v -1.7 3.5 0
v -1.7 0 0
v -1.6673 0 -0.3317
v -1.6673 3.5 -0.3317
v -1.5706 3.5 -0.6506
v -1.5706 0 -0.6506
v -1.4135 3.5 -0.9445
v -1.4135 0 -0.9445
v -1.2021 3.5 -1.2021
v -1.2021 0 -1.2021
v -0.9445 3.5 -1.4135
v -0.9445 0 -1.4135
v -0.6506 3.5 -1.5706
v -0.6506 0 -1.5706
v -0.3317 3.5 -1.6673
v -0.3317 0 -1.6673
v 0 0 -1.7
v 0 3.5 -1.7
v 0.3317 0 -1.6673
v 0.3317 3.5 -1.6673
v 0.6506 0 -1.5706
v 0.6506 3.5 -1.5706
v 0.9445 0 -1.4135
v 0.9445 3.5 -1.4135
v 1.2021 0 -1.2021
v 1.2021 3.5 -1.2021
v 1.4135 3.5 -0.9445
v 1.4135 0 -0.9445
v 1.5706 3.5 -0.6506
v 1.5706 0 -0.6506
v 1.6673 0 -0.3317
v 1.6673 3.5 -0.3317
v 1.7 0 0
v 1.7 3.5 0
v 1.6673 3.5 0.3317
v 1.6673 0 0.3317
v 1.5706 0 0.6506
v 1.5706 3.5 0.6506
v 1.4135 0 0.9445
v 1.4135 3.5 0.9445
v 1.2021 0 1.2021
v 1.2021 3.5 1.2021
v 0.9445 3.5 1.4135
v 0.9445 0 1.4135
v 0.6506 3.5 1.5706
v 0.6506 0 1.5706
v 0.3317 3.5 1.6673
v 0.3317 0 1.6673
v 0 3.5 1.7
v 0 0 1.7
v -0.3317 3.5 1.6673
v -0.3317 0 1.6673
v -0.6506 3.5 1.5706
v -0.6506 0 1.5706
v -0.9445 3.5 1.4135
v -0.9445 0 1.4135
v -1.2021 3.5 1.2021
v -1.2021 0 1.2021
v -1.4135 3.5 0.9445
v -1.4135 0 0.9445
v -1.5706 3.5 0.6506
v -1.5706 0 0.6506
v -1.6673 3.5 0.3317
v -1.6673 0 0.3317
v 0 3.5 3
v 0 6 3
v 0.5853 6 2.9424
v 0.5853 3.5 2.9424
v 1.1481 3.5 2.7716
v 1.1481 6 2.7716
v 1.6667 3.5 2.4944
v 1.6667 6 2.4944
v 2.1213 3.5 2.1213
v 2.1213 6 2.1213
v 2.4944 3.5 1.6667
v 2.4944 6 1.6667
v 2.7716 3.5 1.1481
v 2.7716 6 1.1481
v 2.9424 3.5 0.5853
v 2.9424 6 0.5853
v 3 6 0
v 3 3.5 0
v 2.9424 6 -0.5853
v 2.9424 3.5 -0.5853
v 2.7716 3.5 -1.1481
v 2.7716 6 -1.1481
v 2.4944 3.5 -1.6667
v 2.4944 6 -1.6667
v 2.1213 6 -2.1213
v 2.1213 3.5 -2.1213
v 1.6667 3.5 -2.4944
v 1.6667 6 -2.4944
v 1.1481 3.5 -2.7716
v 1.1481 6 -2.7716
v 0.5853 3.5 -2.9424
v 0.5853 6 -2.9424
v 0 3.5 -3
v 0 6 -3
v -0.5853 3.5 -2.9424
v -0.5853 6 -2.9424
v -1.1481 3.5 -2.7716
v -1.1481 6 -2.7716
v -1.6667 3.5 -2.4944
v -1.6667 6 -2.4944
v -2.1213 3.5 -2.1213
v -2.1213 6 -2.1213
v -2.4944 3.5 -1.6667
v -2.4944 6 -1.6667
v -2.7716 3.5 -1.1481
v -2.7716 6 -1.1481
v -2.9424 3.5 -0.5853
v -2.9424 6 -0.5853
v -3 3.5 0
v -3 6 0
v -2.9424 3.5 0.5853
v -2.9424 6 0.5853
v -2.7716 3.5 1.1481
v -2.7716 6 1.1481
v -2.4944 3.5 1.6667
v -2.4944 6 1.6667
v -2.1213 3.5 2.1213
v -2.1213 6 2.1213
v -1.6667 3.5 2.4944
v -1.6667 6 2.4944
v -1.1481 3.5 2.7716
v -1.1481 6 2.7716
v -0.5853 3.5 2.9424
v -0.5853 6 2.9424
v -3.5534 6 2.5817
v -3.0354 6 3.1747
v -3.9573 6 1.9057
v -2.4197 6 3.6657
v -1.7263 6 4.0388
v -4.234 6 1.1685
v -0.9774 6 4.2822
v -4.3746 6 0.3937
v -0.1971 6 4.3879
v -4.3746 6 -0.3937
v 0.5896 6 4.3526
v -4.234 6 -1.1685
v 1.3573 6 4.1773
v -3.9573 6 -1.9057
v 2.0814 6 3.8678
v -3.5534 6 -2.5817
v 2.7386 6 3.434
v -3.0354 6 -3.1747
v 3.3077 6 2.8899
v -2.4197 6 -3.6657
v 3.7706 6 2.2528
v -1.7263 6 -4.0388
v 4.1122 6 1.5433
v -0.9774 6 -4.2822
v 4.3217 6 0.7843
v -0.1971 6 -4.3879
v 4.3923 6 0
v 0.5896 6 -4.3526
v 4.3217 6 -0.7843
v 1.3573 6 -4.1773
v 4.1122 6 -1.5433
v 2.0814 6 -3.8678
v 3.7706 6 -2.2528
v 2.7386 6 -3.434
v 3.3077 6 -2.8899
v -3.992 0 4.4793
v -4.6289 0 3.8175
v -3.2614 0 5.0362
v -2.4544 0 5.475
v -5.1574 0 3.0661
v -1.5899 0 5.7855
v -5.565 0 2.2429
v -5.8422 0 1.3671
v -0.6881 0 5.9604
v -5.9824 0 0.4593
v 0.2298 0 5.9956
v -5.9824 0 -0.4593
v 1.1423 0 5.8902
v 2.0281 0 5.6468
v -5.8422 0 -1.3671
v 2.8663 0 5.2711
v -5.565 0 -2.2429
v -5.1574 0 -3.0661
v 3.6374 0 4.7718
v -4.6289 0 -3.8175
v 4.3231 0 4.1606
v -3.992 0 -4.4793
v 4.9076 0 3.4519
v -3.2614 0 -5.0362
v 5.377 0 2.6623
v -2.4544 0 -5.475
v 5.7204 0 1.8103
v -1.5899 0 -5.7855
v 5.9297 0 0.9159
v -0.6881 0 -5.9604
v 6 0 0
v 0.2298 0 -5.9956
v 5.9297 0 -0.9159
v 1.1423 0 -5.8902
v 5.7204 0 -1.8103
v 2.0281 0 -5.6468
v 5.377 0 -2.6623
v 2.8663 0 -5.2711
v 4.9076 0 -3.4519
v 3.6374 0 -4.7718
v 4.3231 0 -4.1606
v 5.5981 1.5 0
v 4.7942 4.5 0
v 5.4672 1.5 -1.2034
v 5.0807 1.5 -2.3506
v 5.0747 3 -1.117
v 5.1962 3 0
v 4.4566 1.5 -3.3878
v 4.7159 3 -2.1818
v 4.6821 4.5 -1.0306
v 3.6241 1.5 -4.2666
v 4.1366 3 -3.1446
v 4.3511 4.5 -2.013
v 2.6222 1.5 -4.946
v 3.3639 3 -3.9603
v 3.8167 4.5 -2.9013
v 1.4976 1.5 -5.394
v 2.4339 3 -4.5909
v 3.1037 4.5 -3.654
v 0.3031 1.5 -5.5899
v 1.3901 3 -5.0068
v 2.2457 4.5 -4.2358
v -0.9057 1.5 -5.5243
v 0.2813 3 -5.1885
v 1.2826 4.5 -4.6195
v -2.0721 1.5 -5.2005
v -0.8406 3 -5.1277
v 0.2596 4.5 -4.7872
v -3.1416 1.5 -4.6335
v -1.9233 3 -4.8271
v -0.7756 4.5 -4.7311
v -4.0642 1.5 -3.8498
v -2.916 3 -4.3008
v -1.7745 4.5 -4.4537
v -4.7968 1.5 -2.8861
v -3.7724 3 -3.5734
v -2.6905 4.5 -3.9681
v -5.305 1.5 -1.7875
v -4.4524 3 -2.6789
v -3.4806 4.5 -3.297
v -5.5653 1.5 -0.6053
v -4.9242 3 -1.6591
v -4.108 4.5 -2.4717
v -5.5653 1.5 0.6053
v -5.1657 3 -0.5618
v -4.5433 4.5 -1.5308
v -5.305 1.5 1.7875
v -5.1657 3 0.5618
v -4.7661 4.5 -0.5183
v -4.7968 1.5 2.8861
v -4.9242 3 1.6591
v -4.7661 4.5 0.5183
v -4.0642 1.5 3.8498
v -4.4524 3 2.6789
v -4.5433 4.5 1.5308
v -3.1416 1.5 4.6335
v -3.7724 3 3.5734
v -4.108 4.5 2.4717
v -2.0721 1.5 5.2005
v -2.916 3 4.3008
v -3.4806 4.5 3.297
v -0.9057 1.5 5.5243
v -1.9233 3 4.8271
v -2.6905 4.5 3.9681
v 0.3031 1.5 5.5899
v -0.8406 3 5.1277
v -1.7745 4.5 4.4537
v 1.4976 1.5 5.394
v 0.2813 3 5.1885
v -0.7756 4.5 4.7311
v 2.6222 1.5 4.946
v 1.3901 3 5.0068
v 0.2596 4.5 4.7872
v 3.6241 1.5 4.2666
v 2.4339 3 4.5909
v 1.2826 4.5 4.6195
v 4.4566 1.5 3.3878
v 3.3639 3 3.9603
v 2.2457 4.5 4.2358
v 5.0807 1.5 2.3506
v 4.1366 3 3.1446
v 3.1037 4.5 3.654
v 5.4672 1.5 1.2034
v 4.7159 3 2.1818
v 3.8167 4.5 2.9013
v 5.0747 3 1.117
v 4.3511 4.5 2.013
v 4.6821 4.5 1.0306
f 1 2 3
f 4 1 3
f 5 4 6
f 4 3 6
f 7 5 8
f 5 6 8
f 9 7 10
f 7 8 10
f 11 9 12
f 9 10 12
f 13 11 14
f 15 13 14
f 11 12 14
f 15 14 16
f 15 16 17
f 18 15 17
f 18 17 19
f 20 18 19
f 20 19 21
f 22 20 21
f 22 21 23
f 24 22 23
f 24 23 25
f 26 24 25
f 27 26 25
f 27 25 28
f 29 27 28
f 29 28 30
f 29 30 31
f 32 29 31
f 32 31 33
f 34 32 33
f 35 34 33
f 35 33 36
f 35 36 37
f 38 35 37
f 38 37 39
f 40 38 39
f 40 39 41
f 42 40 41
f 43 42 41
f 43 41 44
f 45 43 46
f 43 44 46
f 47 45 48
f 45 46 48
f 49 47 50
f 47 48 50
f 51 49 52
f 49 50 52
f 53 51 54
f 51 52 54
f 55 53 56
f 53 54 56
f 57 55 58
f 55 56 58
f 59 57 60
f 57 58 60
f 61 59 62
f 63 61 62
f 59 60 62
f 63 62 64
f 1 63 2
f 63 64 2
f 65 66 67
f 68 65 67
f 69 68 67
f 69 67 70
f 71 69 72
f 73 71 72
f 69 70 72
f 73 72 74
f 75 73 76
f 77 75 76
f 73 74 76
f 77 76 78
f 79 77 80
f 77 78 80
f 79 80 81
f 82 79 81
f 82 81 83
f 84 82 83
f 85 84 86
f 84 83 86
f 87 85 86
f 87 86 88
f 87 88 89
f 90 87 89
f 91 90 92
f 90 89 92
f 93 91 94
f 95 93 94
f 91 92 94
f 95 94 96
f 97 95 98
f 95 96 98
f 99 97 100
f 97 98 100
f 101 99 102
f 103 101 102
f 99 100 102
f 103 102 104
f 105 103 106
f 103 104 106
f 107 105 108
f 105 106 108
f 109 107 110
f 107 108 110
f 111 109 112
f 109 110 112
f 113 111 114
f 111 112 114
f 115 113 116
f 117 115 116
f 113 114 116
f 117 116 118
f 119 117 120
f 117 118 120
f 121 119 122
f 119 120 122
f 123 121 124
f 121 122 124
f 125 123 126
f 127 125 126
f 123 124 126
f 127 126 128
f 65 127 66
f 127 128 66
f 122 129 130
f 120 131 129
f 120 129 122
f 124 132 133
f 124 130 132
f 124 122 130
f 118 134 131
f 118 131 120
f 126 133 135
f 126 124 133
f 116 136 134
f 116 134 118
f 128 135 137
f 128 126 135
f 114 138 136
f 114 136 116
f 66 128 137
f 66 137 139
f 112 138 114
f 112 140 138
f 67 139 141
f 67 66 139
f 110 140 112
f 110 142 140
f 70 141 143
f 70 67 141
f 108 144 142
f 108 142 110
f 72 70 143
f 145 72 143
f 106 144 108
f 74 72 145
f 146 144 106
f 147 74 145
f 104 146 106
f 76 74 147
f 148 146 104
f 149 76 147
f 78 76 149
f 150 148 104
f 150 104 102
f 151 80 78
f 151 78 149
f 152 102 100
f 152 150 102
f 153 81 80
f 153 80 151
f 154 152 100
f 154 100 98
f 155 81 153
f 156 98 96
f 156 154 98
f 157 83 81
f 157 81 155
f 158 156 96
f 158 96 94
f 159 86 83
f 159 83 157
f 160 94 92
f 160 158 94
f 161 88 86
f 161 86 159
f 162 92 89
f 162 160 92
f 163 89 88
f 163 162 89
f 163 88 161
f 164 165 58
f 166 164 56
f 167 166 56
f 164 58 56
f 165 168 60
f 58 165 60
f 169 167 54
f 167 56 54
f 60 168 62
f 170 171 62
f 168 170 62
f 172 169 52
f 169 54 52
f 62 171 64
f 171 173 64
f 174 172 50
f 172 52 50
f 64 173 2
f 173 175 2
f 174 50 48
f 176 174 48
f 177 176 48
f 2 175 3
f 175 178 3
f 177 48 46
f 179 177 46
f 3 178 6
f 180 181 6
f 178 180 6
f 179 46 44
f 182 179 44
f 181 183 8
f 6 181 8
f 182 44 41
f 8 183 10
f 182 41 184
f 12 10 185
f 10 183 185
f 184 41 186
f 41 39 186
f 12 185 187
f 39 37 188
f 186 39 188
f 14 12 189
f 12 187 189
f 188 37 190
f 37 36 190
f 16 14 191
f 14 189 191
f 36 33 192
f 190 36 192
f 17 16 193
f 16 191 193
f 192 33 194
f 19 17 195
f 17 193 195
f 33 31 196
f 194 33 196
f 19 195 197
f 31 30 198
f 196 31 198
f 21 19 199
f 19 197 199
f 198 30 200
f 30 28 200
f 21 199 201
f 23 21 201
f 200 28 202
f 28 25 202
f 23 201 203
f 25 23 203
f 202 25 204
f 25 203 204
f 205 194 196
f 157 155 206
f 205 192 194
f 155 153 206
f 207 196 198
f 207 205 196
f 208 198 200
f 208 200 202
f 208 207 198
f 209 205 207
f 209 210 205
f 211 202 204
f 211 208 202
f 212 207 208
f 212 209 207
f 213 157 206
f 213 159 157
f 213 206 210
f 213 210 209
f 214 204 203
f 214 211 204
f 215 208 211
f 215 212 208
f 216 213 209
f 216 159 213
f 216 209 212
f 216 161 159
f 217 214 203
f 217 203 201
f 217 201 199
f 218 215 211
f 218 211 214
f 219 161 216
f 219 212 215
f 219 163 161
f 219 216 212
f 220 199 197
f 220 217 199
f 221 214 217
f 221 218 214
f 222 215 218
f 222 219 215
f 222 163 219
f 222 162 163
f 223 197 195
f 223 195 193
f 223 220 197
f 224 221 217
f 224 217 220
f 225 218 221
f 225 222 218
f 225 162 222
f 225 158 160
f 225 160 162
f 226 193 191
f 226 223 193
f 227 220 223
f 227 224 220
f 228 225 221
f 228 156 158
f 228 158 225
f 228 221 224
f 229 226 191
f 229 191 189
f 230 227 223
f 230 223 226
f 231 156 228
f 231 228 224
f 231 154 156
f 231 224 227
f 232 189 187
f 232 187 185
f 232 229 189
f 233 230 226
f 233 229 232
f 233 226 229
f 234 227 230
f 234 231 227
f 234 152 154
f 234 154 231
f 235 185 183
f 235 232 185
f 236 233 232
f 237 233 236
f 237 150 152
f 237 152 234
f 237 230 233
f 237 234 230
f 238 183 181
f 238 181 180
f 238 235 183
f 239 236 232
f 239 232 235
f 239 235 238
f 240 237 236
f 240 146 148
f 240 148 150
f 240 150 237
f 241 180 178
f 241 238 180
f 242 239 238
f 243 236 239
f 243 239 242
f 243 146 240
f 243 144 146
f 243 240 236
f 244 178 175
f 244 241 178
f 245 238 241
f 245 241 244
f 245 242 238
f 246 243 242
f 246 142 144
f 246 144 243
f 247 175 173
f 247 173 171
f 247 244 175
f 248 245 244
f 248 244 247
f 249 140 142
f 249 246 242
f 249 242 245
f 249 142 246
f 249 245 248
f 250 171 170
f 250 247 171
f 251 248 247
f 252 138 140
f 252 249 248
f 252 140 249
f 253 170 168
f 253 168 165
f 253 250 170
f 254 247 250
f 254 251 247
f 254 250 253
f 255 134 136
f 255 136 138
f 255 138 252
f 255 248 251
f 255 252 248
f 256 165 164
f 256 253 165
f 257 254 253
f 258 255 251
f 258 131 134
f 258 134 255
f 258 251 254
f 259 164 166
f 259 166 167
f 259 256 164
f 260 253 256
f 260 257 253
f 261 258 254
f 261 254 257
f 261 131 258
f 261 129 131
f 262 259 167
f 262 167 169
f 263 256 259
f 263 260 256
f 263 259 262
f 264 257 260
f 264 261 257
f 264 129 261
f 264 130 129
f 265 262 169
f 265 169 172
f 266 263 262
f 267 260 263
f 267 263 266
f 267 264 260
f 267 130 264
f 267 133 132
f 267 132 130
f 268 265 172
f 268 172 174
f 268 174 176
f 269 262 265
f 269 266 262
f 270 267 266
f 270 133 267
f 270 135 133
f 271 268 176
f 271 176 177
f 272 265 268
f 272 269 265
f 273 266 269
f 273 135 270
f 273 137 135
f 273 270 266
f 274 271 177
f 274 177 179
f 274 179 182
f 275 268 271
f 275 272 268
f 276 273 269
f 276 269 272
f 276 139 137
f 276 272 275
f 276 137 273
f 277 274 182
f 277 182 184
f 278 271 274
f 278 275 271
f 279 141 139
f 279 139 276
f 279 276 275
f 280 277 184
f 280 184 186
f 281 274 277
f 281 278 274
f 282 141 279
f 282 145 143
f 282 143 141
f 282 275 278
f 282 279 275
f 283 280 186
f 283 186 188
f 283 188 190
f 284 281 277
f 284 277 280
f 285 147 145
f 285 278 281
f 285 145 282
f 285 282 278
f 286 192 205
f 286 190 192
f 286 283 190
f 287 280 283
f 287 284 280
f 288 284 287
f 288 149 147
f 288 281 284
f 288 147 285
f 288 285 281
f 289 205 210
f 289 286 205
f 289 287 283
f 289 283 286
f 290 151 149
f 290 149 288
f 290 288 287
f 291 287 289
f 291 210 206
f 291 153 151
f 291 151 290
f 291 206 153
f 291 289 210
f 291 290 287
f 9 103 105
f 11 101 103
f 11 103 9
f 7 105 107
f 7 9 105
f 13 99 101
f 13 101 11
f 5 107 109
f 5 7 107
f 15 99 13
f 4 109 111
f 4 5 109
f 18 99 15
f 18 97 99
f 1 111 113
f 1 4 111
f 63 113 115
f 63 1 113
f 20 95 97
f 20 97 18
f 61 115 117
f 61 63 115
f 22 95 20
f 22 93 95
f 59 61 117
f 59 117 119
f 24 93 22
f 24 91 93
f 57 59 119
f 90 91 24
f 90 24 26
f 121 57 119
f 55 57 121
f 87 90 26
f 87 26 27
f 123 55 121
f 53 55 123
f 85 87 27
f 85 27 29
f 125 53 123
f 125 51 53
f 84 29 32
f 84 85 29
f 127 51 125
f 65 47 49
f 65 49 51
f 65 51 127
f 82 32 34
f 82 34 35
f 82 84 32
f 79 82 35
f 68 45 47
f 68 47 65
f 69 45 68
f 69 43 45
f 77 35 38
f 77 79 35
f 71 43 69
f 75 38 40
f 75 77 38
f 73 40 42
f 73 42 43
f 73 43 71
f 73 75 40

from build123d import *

# Parameters (mm, degrees)
ESQUISSE1_R             = 6
BOSS_EXTRU_1_DEPTH      = 6
BOSS_EXTRU_1_TAPER      = 15
ESQUISSE2_R             = 3
ENL_V_MAT_EXTRU_1_DEPTH = 2.5
D_GAGEMENT_M31_D        = 3.4


with BuildPart() as part:
    # Esquisse1 → Boss.-Extru.1 (new body)
    with BuildSketch(Plane(origin=(0, 0, 0), x_dir=(1, 0, 0), z_dir=(0, 1, 0))):
        Circle(ESQUISSE1_R)
    extrude(amount=BOSS_EXTRU_1_DEPTH, taper=BOSS_EXTRU_1_TAPER)

    # Esquisse2 → Enlèv. mat.-Extru.1 (cut)
    with BuildSketch(Plane(origin=(0, 6, 0), x_dir=(1, 0, 0), z_dir=(0, 1, 0))):
        with Locations(Location((0, 0, 0), (0, 0, 270))):
            Circle(ESQUISSE2_R)
    extrude(amount=-ENL_V_MAT_EXTRU_1_DEPTH, mode=Mode.SUBTRACT)

    # Dégagement M31 (through all)
    with Locations(Plane(origin=(0, 3.5, 0), x_dir=(1, 0, 0), z_dir=(0, 1, 0))):
        with Locations((0, 0)):
            Hole(D_GAGEMENT_M31_D / 2)


solid = part.part
